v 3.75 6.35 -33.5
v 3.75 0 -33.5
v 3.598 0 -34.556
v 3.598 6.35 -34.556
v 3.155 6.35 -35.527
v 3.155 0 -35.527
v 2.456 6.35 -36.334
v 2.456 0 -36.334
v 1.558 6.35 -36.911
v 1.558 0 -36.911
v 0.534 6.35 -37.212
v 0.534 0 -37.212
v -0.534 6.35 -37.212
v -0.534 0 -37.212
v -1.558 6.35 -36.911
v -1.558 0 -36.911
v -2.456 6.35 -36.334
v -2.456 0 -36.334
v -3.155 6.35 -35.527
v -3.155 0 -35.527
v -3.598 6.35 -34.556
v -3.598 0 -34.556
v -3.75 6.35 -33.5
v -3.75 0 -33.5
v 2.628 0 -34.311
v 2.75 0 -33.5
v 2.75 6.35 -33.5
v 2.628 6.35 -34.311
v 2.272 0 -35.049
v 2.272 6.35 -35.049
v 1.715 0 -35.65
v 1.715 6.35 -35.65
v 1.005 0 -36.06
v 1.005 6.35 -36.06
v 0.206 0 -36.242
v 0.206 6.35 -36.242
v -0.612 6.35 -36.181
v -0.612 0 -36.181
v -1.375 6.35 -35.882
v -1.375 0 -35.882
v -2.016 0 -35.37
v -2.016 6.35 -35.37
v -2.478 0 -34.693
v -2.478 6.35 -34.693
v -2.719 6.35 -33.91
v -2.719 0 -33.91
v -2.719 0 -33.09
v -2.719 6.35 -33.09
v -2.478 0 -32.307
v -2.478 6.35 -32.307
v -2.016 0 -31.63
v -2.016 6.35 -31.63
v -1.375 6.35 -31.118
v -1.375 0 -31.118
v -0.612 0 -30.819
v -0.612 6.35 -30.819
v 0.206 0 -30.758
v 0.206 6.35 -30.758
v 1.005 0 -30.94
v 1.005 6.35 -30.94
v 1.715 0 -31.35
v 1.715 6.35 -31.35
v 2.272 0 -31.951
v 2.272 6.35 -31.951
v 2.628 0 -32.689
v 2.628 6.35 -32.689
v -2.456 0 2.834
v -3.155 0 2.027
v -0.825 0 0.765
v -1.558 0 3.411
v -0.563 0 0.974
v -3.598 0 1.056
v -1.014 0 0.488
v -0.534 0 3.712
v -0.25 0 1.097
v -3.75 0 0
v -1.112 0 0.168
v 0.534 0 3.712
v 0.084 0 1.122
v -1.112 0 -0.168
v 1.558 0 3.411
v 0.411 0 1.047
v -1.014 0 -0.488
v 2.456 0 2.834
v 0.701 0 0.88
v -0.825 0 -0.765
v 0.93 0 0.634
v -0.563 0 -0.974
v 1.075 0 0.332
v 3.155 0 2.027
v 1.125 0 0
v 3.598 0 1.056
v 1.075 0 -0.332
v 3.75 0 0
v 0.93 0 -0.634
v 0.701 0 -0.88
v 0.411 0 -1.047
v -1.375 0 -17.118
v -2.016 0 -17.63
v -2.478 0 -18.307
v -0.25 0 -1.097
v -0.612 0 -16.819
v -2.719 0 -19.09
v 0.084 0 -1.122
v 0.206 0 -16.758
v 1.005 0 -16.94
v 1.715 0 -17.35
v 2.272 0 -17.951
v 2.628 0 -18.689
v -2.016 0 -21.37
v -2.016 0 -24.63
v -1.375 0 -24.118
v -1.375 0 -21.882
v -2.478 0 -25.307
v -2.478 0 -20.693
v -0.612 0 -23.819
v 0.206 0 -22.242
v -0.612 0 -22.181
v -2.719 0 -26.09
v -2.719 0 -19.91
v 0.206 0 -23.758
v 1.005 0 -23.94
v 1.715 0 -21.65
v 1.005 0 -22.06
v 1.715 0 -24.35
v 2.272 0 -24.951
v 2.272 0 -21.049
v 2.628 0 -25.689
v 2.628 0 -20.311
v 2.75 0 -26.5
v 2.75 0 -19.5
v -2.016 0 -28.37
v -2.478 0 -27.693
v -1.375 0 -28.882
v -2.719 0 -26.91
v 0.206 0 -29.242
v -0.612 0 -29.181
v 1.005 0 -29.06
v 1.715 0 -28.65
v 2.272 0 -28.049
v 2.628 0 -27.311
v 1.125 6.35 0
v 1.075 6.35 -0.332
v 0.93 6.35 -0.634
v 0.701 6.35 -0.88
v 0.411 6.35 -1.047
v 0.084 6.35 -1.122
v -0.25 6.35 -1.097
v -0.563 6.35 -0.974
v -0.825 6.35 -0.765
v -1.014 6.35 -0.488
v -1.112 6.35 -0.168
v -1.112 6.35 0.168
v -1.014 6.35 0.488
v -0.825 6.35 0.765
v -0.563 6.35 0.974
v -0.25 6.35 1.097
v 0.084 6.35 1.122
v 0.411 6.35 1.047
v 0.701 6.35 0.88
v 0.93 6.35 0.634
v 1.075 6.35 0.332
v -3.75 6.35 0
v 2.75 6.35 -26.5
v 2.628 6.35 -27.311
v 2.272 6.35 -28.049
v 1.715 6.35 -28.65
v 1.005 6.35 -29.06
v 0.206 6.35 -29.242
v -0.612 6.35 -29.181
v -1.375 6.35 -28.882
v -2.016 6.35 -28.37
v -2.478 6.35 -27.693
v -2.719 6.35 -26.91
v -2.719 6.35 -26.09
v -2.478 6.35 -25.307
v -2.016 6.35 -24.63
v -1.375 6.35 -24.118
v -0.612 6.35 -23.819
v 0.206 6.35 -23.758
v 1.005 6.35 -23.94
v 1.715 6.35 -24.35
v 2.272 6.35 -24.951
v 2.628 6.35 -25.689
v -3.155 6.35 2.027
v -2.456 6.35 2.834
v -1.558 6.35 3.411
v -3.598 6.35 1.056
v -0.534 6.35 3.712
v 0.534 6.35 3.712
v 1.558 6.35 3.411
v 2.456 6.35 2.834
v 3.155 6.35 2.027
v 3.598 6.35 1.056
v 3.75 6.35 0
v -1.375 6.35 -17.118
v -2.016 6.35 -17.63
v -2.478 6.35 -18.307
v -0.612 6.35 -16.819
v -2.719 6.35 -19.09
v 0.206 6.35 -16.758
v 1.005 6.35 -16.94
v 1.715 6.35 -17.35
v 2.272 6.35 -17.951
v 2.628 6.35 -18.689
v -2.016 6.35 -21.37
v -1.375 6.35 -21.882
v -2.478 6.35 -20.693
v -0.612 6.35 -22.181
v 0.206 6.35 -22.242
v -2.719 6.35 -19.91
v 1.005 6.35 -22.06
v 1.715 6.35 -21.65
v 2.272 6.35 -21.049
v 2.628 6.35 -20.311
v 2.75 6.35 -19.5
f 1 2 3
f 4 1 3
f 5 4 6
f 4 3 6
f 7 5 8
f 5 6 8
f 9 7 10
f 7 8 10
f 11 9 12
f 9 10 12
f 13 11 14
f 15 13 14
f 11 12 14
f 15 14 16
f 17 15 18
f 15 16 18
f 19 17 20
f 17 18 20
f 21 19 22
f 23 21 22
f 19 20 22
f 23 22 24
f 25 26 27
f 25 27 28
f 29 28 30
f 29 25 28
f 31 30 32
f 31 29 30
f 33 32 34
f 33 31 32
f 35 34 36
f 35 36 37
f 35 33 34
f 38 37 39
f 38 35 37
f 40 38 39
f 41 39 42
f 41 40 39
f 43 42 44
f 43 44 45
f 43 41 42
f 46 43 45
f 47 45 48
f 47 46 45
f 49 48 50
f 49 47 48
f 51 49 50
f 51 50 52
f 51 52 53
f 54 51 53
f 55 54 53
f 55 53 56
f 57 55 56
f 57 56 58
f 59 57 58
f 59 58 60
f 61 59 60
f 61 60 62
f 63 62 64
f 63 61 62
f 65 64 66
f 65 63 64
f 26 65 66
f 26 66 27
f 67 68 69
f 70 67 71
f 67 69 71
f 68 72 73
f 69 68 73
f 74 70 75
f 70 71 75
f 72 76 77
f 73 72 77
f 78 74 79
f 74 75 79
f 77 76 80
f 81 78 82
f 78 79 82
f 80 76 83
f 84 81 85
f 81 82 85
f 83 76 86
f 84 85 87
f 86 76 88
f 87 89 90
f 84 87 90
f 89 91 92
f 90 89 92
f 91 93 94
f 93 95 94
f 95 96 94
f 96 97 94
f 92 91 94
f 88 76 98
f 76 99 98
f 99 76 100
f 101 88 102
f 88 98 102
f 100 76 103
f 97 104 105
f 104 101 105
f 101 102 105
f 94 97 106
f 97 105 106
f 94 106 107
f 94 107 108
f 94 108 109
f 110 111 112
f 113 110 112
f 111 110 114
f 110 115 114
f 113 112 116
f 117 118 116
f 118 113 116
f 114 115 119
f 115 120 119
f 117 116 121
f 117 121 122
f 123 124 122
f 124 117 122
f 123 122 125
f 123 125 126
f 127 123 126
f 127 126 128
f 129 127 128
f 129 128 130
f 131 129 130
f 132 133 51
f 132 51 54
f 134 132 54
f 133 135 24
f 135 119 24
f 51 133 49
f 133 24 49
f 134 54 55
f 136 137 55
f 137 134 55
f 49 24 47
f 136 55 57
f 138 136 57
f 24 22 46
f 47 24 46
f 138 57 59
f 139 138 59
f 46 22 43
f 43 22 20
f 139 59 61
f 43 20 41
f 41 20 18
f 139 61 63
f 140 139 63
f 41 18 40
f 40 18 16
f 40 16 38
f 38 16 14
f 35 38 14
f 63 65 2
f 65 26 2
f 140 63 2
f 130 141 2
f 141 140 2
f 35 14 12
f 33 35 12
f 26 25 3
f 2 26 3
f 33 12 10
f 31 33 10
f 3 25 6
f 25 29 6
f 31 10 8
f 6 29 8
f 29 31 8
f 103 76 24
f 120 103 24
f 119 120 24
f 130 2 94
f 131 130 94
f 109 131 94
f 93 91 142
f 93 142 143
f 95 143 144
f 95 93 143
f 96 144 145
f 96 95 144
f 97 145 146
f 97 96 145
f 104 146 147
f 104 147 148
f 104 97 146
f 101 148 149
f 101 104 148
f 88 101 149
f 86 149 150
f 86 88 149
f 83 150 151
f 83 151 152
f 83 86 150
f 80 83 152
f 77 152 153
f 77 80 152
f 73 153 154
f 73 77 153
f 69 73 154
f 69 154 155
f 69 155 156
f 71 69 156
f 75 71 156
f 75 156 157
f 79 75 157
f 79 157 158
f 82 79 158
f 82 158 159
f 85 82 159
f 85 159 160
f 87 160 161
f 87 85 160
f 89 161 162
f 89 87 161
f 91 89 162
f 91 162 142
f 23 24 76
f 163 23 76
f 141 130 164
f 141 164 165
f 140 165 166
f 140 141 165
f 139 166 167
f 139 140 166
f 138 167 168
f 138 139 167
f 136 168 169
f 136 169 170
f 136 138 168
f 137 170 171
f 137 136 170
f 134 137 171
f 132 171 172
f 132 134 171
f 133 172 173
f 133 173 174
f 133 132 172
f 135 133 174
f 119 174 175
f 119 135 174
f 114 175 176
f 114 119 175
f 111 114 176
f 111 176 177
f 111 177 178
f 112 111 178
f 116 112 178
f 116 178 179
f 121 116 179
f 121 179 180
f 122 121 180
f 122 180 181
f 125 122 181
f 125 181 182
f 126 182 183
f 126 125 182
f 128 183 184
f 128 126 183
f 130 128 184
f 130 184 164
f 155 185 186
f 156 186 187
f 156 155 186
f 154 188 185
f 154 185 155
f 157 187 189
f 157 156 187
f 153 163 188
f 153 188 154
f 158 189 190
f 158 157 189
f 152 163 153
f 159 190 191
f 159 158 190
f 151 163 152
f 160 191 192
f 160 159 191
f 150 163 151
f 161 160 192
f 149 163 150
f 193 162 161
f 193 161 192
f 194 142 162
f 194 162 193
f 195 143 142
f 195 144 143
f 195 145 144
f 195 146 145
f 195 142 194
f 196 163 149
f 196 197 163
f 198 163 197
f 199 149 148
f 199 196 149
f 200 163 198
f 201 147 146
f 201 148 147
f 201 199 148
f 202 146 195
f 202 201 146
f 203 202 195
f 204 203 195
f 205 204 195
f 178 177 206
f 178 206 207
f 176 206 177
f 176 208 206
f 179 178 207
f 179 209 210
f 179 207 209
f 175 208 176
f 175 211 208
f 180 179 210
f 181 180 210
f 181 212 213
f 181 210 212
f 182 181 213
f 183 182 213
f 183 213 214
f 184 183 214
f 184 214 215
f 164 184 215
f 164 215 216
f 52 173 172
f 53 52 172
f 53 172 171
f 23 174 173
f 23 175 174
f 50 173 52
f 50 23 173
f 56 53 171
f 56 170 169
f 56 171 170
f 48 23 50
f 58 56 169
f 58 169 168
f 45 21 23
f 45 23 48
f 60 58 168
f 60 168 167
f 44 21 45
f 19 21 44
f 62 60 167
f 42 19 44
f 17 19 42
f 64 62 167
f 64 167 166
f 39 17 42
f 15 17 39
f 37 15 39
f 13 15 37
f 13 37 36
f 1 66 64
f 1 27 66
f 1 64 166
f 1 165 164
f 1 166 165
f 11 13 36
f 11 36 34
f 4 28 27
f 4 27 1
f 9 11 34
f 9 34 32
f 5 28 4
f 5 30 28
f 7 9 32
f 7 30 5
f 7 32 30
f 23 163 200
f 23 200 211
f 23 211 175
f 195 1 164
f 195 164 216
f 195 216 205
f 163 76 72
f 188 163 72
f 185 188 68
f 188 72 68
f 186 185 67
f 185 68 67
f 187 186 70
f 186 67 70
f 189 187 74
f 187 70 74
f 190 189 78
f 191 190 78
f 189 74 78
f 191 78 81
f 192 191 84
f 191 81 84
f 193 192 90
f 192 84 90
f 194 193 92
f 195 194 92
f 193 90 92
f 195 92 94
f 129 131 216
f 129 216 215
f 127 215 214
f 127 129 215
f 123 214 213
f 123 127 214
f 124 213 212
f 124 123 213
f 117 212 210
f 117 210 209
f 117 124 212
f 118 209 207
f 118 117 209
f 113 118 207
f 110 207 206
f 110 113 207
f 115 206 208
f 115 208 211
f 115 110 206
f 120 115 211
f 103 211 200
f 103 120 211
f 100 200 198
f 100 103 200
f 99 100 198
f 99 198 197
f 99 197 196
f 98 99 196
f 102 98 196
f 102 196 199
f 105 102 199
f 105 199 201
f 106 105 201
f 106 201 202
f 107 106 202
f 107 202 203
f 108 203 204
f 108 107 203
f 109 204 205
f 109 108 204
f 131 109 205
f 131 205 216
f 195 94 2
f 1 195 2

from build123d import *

# Parameters (mm, degrees)
SKETCH1_R           = 1.125
SKETCH1_R_2         = 2.75
BOSS_EXTRUDE1_DEPTH = 6.35
SKETCH2_R           = 2.75
CUT_EXTRUDE2_DEPTH  = 6.35


with BuildPart() as part:
    # Sketch1 → Boss-Extrude1 (new body)
    with BuildSketch(Plane(origin=(0, 0, 0), x_dir=(1, 0, 0), z_dir=(0, 1, 0))):
        with BuildLine():
            Line((-3.75, 33.5), (-3.75, 0))
            ThreePointArc((-3.75, 0), (0, -3.75), (3.75, 0))
            Line((3.75, 0), (3.75, 33.5))
            ThreePointArc((3.75, 33.5), (0, 37.25), (-3.75, 33.5))
        make_face()
        Circle(SKETCH1_R, mode=Mode.SUBTRACT)
        with Locations((0, 33.5)):
            Circle(SKETCH1_R_2, mode=Mode.SUBTRACT)
    extrude(amount=BOSS_EXTRUDE1_DEPTH)

    # Sketch2 → Cut-Extrude2 (cut)
    with BuildSketch(Plane(origin=(0, 0, 0), x_dir=(1, 0, 0), z_dir=(0, 1, 0))):
        with Locations((0, 33.5)):
            Circle(SKETCH2_R)
        with Locations((0, 19.5)):
            Circle(SKETCH2_R)
        with Locations((0, 26.5)):
            Circle(SKETCH2_R)
    extrude(amount=CUT_EXTRUDE2_DEPTH, mode=Mode.SUBTRACT)


solid = part.part
